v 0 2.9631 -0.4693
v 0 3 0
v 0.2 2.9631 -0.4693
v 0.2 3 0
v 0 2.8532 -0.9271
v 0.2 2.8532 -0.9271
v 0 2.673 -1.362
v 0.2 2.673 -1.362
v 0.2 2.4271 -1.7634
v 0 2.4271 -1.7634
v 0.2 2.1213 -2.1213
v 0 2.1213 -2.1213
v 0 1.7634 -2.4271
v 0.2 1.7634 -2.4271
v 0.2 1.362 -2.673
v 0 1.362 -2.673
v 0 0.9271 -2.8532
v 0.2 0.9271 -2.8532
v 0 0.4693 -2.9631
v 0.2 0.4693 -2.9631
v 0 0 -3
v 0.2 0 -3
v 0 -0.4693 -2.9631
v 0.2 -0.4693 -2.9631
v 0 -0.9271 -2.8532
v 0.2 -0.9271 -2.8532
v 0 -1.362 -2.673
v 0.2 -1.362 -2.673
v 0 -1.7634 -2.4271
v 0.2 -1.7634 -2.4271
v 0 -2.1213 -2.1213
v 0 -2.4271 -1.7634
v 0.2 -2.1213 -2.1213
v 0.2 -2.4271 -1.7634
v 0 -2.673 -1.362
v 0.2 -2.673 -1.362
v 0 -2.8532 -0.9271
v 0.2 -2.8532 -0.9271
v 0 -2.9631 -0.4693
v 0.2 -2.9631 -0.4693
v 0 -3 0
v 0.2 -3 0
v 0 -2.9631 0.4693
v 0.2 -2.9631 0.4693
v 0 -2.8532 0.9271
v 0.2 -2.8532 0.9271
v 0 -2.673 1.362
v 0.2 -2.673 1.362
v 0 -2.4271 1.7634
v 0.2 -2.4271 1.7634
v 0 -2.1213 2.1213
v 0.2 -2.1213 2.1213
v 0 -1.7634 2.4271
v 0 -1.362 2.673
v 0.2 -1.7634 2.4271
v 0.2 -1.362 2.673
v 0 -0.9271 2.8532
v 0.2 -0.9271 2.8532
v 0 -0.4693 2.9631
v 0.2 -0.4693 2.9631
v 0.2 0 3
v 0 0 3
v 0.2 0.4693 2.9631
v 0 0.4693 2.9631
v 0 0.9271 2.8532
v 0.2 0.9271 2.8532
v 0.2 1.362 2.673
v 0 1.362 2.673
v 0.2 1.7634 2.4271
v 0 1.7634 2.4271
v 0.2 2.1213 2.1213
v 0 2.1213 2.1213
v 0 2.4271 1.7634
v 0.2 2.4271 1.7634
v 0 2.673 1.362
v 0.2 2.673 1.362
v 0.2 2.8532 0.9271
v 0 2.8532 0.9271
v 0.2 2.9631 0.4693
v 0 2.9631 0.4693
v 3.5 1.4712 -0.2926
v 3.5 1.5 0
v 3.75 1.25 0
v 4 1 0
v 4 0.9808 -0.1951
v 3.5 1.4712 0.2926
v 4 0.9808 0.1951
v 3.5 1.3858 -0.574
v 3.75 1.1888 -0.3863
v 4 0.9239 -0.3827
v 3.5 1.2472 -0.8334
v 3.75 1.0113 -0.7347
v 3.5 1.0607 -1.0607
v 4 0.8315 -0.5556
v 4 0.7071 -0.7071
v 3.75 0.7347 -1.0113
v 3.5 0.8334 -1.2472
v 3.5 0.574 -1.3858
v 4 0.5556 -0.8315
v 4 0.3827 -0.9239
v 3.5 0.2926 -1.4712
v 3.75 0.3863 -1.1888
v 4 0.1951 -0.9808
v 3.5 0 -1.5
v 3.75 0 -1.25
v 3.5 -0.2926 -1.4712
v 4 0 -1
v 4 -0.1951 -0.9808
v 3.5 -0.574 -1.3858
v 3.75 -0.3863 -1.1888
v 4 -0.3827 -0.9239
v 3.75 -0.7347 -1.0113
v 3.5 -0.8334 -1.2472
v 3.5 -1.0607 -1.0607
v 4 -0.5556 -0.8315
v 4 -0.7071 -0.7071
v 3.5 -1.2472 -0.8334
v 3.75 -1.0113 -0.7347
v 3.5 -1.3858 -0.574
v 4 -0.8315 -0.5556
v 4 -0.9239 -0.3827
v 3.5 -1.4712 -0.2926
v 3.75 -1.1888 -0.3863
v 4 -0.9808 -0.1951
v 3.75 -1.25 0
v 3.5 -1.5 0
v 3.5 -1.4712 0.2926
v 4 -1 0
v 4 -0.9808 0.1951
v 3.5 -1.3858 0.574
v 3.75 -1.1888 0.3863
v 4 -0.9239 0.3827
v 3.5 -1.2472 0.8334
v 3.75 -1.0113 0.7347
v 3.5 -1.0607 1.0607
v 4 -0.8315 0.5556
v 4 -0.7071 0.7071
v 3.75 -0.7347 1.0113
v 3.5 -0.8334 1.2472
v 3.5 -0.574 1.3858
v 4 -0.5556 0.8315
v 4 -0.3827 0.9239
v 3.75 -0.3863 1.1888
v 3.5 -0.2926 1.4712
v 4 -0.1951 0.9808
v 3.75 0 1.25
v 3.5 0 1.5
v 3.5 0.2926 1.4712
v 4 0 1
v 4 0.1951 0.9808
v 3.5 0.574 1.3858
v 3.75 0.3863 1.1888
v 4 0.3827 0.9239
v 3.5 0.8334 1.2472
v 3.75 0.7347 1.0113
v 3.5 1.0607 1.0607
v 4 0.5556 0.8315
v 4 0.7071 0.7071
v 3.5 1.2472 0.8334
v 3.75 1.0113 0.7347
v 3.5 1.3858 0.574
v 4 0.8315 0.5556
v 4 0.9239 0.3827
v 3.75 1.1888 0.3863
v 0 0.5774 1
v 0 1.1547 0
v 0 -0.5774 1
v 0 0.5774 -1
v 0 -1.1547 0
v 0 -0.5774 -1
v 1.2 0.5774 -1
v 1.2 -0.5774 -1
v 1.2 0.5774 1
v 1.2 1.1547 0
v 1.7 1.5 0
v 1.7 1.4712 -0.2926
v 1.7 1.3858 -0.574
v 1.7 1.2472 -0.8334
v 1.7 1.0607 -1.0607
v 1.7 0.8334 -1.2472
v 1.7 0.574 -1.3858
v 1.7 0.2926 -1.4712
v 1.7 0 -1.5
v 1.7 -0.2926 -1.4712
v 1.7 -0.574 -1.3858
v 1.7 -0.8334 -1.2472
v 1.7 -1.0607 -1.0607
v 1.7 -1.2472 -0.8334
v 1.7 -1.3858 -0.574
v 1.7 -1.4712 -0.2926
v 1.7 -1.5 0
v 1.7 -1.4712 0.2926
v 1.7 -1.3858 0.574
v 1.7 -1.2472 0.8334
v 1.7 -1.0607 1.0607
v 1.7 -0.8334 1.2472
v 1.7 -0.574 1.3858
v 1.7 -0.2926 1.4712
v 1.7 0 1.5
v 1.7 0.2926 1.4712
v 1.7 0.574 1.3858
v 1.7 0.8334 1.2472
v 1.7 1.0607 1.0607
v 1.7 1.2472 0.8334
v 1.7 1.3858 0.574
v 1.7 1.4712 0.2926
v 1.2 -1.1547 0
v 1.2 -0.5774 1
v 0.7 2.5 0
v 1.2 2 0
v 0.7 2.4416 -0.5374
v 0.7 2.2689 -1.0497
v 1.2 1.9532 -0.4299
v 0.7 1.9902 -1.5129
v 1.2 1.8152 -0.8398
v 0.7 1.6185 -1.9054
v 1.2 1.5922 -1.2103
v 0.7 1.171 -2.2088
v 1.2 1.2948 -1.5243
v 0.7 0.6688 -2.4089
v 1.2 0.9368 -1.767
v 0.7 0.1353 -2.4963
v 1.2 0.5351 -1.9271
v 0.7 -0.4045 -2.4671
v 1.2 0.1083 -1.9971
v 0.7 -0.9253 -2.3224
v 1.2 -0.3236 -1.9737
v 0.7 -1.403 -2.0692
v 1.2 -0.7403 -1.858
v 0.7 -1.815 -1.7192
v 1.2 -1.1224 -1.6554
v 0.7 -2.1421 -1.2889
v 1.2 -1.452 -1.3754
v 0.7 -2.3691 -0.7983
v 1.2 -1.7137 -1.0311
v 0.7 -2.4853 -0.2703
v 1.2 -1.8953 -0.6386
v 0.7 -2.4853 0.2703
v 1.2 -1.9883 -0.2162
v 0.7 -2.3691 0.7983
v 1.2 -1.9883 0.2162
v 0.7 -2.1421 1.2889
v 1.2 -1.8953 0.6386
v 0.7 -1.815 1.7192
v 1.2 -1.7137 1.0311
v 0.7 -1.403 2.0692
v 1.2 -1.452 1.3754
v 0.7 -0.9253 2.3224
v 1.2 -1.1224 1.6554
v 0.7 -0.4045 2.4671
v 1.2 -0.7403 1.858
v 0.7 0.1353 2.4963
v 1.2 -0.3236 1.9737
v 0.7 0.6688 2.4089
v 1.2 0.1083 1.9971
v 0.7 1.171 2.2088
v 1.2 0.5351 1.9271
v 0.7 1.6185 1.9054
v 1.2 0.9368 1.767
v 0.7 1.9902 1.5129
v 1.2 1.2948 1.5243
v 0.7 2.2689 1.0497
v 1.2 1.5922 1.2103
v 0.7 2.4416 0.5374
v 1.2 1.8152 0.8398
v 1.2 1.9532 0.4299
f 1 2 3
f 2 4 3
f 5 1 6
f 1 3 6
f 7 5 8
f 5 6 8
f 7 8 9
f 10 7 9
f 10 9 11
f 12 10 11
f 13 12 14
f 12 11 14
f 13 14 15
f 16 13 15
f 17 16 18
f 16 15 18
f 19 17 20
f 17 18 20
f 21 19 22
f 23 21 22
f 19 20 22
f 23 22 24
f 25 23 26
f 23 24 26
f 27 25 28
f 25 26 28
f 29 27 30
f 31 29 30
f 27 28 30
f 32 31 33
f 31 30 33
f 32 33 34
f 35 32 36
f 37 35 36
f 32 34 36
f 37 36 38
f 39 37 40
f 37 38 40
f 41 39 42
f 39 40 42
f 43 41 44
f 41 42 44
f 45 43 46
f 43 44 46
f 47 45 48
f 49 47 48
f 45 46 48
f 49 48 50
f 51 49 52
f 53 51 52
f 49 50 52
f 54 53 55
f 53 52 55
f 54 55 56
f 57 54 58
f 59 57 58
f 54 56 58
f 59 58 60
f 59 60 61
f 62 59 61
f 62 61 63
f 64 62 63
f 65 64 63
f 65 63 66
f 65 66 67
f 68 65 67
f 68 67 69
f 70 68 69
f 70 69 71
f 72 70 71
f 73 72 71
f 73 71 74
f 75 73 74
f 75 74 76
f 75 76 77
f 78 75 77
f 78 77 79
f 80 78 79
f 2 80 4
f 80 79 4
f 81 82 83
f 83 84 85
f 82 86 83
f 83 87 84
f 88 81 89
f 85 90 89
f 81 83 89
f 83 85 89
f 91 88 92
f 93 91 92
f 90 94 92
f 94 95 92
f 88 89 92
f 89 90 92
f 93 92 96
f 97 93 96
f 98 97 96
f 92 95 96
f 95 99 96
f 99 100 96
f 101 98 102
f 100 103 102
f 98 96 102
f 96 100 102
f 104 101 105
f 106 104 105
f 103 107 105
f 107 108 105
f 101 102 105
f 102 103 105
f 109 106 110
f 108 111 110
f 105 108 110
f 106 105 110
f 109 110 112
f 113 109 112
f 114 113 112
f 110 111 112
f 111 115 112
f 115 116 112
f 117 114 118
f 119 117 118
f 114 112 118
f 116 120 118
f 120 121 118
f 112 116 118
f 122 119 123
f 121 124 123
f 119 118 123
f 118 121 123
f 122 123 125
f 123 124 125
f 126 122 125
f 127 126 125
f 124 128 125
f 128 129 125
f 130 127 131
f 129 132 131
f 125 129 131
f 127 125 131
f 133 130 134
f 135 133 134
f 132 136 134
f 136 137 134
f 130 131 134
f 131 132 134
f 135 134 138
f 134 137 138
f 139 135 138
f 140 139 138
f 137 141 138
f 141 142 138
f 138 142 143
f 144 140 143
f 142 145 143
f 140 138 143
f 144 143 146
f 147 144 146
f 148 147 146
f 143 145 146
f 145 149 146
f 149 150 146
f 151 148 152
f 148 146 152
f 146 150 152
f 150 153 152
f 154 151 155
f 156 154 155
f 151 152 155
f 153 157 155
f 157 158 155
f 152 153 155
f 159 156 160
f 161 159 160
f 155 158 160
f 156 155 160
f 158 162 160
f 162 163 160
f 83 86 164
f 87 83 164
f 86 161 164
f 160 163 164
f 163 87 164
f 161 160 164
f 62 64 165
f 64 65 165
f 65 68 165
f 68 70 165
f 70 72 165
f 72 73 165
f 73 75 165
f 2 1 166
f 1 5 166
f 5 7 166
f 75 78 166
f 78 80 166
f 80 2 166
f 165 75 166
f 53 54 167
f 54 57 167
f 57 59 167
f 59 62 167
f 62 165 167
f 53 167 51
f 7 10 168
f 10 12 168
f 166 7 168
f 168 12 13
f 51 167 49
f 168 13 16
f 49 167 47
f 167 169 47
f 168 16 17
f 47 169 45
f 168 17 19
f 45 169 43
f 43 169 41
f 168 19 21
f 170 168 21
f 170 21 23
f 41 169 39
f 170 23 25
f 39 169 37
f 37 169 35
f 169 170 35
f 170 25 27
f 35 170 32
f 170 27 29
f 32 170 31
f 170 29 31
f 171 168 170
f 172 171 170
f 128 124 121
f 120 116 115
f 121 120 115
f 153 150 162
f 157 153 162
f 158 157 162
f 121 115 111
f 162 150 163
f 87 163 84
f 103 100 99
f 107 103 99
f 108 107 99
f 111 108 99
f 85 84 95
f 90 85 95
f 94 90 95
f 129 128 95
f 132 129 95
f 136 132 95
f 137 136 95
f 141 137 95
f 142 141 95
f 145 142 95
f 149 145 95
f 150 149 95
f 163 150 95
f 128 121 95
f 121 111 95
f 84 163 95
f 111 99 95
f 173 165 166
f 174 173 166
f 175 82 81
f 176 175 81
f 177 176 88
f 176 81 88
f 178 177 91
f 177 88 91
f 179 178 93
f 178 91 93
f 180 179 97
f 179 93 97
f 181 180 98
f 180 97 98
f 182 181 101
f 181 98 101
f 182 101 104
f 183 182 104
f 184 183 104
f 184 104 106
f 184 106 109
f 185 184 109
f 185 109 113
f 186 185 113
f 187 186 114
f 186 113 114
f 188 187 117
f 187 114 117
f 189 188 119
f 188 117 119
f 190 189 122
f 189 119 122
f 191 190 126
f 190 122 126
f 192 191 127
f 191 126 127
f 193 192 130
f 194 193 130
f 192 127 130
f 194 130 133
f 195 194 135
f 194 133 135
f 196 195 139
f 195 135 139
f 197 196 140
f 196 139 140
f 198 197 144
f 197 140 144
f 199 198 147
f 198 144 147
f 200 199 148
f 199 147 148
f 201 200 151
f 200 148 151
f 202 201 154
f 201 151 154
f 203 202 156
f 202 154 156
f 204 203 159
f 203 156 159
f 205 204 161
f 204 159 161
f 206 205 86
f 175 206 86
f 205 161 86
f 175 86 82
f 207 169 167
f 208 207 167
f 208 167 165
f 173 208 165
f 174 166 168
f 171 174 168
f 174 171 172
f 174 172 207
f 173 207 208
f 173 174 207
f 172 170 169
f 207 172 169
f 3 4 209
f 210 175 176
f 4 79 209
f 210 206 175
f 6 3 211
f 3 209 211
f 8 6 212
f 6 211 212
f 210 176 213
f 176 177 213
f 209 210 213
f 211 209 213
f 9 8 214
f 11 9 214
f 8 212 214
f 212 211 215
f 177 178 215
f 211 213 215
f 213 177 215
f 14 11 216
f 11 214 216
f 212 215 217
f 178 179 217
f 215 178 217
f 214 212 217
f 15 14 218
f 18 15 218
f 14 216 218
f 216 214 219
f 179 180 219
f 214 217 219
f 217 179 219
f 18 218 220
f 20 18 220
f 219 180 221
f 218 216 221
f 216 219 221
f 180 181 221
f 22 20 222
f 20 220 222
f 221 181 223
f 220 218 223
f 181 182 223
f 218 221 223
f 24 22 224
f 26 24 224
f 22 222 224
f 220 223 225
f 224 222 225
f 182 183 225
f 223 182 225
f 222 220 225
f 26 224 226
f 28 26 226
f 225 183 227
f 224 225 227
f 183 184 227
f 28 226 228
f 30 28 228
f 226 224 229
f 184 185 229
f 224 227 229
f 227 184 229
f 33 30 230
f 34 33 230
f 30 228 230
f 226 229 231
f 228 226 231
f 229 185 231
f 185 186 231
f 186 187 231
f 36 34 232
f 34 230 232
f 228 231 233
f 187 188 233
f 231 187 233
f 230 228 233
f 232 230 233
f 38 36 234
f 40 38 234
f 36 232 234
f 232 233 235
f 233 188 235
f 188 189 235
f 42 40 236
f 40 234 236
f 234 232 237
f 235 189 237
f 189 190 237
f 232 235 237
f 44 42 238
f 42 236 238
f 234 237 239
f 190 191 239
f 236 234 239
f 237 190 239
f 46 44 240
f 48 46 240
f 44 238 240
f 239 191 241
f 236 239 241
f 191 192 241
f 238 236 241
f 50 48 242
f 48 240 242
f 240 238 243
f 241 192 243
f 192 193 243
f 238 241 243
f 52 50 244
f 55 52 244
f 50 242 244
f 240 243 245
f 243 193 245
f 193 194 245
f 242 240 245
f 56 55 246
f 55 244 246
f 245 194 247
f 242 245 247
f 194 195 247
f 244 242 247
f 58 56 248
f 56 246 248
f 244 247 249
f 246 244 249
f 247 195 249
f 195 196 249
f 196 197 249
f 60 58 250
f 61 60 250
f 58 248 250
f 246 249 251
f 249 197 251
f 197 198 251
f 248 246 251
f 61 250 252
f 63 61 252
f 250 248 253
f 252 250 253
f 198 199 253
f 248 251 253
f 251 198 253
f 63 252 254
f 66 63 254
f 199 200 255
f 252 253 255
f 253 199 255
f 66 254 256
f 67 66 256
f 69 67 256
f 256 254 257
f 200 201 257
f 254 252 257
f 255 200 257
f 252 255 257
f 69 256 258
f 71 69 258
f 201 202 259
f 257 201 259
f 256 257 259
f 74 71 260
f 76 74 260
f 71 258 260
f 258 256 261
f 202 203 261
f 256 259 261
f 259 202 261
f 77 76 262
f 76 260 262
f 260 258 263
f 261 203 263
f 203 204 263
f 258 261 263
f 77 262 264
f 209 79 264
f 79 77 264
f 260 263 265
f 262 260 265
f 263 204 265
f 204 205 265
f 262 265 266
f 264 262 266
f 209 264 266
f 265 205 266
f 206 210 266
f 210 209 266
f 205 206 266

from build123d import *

# Parameters (mm, degrees)
CHANFREIN1_SIZE         = 0.5
ENL_V_MAT_EXTRU_1_DEPTH = 1.2


with BuildPart() as part:
    # Esquisse1 → Révolution1 (revolve)
    with BuildSketch(Plane.XY):
        Polygon((0, 0), (0, 3), (0.2, 3), (1.7, 1.5), (4, 1.5), (4, 0), align=None)
    revolve(axis=Axis((4, 0, 0), (-1, 0, 0)))

    # Chanfrein1
    chanfrein1_edges = [part.edges().sort_by_distance(p)[0] for p in [
        (4, -1.5, 0),
    ]]
    chamfer(chanfrein1_edges, length=CHANFREIN1_SIZE)

    # Esquisse2 → Enlèv. mat.-Extru.1 (cut)
    with BuildSketch(Plane.ZY):
        Polygon((0, 1.154700538), (-1, 0.577350269), (-1, -0.577350269), (0, -1.154700538), (1, -0.577350269), (1, 0.577350269), align=None)
    extrude(amount=-ENL_V_MAT_EXTRU_1_DEPTH, mode=Mode.SUBTRACT)


solid = part.part
